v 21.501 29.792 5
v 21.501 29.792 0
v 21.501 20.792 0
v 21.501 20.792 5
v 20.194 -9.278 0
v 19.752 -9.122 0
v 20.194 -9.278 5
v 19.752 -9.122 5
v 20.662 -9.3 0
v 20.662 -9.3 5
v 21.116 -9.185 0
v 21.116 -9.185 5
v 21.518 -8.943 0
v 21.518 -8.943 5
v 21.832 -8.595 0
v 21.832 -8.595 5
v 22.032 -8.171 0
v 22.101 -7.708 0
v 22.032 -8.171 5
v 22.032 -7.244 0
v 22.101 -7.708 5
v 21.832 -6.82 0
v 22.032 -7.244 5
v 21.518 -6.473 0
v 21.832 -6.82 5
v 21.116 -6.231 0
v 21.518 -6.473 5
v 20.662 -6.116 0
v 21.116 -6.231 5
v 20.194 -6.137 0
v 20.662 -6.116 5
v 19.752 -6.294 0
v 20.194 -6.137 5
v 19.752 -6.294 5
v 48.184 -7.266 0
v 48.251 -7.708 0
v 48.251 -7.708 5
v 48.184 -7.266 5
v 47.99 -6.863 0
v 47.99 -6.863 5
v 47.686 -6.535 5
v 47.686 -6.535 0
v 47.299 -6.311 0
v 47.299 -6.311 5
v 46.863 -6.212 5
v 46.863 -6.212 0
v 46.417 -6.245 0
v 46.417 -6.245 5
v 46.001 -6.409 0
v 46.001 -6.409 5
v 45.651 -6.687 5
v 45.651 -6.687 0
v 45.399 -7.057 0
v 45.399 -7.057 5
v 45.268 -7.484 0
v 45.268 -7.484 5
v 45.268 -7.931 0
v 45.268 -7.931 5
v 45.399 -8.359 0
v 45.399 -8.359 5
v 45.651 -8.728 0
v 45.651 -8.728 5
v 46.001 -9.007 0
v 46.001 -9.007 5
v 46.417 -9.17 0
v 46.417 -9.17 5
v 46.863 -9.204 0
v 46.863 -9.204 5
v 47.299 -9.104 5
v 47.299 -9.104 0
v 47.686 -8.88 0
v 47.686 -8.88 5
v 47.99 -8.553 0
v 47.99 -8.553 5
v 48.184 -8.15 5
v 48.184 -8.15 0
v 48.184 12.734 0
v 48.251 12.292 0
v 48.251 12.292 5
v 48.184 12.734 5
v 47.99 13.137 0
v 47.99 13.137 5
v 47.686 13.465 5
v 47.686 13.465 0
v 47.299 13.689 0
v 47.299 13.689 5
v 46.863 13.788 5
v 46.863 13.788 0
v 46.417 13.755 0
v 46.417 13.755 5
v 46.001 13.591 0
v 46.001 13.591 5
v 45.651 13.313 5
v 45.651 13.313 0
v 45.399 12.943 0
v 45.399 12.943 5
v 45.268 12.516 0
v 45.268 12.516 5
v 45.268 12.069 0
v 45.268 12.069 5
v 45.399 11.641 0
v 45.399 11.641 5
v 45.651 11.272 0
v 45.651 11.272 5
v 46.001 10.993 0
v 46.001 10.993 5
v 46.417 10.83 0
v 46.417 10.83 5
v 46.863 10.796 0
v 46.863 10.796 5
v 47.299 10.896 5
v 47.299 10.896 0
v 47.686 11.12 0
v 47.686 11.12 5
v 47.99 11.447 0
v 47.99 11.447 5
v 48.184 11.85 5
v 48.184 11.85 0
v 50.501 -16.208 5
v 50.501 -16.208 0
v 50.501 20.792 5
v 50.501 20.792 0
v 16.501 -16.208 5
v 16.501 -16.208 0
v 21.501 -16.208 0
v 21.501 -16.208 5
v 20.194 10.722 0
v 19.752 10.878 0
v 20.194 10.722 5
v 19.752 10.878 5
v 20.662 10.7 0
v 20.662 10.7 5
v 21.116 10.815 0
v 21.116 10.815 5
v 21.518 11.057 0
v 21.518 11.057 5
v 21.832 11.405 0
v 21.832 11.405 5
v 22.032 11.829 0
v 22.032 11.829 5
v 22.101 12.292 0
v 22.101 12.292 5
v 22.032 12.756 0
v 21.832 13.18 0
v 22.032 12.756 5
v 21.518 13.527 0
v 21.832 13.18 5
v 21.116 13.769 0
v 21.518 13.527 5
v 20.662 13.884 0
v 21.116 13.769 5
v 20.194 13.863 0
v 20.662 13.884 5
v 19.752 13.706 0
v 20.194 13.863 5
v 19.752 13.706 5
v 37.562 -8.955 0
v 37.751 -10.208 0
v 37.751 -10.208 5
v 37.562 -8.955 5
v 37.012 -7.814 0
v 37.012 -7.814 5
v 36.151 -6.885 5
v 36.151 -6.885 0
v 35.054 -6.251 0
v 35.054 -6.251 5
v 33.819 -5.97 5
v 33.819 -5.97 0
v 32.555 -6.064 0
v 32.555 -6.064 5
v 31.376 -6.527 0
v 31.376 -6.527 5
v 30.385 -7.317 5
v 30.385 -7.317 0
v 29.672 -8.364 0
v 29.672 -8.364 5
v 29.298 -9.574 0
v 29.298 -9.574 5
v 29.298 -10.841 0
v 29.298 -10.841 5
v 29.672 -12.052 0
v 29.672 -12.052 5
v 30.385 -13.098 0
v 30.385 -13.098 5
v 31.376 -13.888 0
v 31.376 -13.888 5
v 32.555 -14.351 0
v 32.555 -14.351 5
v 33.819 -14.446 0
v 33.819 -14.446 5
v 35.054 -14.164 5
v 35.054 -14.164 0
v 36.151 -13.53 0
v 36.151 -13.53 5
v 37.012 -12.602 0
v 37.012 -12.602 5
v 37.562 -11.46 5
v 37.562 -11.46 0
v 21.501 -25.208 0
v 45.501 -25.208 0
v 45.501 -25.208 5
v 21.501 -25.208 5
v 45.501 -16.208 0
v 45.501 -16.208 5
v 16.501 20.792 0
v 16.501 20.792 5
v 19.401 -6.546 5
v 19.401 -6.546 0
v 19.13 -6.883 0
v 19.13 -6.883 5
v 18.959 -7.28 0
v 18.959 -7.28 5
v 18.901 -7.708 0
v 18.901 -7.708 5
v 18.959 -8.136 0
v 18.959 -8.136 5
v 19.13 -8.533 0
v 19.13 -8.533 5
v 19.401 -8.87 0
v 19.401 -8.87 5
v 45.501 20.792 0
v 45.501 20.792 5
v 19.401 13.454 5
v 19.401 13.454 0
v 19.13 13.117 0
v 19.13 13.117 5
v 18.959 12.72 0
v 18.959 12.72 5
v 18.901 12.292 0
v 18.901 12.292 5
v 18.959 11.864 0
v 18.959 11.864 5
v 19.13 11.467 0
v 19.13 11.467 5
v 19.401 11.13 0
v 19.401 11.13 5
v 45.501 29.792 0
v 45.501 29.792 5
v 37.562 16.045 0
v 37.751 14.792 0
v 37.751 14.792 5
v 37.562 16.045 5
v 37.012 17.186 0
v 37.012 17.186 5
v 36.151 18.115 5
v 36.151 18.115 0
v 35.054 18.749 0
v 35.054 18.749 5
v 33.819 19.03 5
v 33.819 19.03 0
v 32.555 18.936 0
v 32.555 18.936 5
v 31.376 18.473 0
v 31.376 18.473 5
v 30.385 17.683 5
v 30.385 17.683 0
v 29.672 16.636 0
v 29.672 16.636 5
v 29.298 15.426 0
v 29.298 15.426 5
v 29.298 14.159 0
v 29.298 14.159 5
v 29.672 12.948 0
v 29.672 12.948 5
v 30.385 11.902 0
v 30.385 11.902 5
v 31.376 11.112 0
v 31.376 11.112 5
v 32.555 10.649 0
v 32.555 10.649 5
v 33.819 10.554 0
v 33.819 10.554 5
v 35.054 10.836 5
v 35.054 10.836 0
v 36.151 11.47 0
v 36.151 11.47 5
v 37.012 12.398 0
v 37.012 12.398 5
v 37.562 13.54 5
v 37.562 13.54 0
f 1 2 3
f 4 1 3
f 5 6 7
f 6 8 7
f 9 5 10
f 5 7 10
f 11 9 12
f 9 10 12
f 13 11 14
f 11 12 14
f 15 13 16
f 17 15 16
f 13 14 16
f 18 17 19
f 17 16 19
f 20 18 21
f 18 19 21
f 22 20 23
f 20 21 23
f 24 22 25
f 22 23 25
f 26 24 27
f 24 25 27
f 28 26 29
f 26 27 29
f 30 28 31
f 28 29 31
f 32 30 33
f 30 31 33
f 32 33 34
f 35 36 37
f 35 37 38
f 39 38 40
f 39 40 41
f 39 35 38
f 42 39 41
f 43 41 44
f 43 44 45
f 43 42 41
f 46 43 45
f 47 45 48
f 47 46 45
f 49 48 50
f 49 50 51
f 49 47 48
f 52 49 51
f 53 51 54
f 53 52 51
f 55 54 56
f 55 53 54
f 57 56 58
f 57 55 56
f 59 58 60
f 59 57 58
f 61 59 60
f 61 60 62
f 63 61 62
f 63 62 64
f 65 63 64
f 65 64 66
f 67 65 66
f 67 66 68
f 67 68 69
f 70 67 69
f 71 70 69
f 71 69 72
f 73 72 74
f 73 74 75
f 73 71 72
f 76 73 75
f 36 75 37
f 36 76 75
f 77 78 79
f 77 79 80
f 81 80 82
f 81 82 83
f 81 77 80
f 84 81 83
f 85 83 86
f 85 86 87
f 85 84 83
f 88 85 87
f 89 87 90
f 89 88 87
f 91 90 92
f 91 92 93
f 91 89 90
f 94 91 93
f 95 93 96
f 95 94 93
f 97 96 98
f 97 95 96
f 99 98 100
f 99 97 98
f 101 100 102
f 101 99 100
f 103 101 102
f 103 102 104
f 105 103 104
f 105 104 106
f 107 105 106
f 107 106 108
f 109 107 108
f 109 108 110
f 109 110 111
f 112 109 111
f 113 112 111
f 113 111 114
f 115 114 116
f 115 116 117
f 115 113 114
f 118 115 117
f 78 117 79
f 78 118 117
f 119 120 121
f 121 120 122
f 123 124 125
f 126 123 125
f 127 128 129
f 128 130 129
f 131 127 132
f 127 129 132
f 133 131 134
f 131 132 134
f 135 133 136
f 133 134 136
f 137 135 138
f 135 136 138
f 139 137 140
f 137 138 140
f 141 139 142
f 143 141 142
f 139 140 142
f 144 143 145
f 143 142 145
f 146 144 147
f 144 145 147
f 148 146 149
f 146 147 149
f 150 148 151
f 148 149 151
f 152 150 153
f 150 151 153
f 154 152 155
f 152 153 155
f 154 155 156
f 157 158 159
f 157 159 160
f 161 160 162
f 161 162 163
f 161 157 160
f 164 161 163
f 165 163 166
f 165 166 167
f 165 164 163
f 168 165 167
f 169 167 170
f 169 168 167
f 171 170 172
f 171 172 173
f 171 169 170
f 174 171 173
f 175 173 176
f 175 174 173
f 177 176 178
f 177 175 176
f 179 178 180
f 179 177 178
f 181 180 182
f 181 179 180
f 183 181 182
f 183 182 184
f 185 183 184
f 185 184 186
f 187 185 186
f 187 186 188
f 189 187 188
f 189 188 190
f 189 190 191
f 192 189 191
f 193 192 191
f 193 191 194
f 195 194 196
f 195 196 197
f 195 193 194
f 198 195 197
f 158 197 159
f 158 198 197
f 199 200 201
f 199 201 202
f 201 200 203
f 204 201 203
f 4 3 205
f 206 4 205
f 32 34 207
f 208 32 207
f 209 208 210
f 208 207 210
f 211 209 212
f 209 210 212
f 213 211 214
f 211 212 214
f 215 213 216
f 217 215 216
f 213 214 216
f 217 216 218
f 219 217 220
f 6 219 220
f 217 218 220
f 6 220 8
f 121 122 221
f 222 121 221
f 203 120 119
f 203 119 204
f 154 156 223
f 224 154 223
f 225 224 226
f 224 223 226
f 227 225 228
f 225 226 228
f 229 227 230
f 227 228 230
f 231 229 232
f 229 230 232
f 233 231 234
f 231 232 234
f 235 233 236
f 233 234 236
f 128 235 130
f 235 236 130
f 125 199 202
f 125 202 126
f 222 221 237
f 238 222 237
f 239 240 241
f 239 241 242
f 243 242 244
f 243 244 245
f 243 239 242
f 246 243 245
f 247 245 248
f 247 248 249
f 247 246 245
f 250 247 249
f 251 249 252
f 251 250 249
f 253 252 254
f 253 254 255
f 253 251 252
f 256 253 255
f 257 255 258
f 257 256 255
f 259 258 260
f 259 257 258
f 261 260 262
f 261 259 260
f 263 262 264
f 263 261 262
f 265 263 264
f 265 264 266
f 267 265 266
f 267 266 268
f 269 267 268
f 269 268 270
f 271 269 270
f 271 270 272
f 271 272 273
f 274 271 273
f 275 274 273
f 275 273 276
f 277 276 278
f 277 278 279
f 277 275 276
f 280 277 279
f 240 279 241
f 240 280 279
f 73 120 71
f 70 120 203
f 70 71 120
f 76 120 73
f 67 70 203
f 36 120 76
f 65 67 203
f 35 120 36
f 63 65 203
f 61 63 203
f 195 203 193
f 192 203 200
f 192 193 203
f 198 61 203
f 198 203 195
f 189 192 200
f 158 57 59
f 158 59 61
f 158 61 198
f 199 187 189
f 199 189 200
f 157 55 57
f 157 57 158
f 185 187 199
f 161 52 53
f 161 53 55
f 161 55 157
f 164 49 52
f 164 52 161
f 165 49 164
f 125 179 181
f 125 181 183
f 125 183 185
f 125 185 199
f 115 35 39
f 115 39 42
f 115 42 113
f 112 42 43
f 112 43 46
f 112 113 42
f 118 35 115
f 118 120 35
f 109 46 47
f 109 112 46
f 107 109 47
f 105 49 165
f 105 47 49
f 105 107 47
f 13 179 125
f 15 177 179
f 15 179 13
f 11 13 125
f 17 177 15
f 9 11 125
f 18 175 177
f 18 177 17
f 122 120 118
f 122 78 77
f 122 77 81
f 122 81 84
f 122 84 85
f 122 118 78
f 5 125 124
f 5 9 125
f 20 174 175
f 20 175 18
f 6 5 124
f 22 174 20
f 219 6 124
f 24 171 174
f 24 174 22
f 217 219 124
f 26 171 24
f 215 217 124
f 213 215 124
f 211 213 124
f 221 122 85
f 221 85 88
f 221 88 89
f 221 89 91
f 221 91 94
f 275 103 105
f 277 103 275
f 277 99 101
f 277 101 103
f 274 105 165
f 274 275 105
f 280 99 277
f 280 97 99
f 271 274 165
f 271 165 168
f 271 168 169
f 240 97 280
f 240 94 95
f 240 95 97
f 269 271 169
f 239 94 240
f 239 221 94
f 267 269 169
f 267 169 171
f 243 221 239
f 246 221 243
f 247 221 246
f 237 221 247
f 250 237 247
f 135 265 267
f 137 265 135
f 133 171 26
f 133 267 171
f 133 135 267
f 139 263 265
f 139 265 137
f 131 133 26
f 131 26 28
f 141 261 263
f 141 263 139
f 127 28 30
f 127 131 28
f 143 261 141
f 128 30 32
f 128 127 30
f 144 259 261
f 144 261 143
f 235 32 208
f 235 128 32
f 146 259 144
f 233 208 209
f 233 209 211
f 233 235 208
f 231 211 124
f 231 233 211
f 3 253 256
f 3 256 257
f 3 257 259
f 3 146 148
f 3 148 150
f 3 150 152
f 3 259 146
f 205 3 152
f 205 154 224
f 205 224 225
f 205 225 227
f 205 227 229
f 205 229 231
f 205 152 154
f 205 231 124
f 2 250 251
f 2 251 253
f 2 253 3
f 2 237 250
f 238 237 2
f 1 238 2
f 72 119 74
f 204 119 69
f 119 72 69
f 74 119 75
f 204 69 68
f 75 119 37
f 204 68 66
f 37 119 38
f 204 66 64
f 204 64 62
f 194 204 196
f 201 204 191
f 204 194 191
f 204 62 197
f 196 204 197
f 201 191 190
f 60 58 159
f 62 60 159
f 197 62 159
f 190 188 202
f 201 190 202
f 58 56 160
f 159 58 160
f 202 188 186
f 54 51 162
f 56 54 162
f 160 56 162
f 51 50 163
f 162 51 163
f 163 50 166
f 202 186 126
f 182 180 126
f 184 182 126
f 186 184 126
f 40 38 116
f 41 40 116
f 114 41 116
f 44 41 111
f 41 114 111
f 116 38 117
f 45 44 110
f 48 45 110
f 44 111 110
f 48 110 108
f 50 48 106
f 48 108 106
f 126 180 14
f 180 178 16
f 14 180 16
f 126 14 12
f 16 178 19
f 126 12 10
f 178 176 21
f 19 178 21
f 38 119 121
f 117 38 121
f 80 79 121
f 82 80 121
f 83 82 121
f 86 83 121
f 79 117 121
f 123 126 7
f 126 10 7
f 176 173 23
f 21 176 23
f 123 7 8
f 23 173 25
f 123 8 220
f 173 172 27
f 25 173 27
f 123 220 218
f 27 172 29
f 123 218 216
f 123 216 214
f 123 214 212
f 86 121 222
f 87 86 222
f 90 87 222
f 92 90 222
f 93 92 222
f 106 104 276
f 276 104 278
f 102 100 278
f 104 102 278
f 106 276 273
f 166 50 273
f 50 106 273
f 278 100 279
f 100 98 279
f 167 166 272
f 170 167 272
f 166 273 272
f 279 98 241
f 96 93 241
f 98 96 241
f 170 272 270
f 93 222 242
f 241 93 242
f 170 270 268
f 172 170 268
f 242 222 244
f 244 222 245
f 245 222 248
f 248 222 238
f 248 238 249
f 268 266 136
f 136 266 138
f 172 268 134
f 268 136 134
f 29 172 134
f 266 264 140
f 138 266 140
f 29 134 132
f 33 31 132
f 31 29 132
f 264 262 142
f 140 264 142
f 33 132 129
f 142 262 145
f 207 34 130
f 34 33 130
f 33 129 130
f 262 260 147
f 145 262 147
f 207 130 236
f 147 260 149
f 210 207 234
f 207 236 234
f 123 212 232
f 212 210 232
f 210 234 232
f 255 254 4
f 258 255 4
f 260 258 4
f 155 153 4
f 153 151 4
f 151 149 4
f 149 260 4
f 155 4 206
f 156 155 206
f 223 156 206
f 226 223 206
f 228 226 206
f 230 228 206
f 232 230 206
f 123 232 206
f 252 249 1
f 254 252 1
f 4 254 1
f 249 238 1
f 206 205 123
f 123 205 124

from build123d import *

# Parameters (mm, degrees)
SKETCH1_R           = 1.5
SKETCH1_R_2         = 4.25
SKETCH1_R_3         = 5
SKETCH1_R_4         = 1
BOSS_EXTRUDE2_DEPTH = 5
SKETCH2_W           = 0.5
SKETCH2_H           = 37
BOSS_EXTRUDE3_DEPTH = 5
CUT_EXTRUDE1_DEPTH  = 10
BOSS_EXTRUDE4_DEPTH = 5
SKETCH5_R           = 1.6
CUT_EXTRUDE2_DEPTH  = 10
BOSS_EXTRUDE5_DEPTH = 5
SKETCH7_R           = 1
BOSS_EXTRUDE6_DEPTH = 5
SKETCH8_W           = 5
SKETCH8_H           = 37
CUT_EXTRUDE3_DEPTH  = 33


with BuildPart() as part:
    # Sketch1 → Boss-Extrude2 (new body)
    with BuildSketch(Plane.XY):
        with BuildLine():
            Line((45.25091594, -25.207708346), (50.00091594, -20.457708346))
            Line((50.00091594, -20.457708346), (50.00091594, 24.688738263))
            Line((50.00091594, 24.688738263), (45.147362549, 29.542291654))
            Line((45.147362549, 29.542291654), (26.35446933, 29.542291654))
            Line((26.35446933, 29.542291654), (21.25091594, 24.438738263))
            Line((21.25091594, 24.438738263), (21.25091594, 18.042291654))
            Line((21.25091594, 18.042291654), (20.408095363, 18.042291654))
            Line((20.408095363, 18.042291654), (16.70086026, 18.042291654))
            ThreePointArc((16.70086026, 18.042291654), (12.892426636, 17.542145454), (9.3422674, 16.075624987))
            ThreePointArc((9.3422674, 16.075624987), (2.182128173, 13.100539865), (-5.49908406, 12.043324729))
            Line((-5.49908406, 12.043324729), (-5.49908406, 12.039085999))
            ThreePointArc((-5.49908406, 12.039085999), (-15.49908406, 2.292291654), (-5.49908406, -7.454502691))
            Line((-5.49908406, -7.454502691), (-5.49908406, -7.458741422))
            ThreePointArc((-5.49908406, -7.458741422), (2.182128173, -8.515956557), (9.3422674, -11.491041679))
            ThreePointArc((9.3422674, -11.491041679), (12.892426636, -12.957562146), (16.70086026, -13.457708346))
            Line((16.70086026, -13.457708346), (20.408095363, -13.457708346))
            Line((20.408095363, -13.457708346), (21.25091594, -13.457708346))
            Line((21.25091594, -13.457708346), (21.25091594, -20.207708346))
            Line((21.25091594, -20.207708346), (26.25091594, -25.207708346))
            Line((26.25091594, -25.207708346), (45.25091594, -25.207708346))
        make_face()
        with Locations((46.75091594, -7.707708346)):
            Circle(SKETCH1_R, mode=Mode.SUBTRACT)
        with Locations((46.75091594, 12.292291654)):
            Circle(SKETCH1_R, mode=Mode.SUBTRACT)
        with Locations((33.50091594, 14.792291654)):
            Circle(SKETCH1_R_2, mode=Mode.SUBTRACT)
        with Locations((33.50091594, -10.207708346)):
            Circle(SKETCH1_R_2, mode=Mode.SUBTRACT)
        with Locations((19.25091594, 12.292291654)):
            Circle(SKETCH1_R, mode=Mode.SUBTRACT)
        with Locations((19.25091594, -7.707708346)):
            Circle(SKETCH1_R, mode=Mode.SUBTRACT)
        with Locations((-5.74908406, 2.292291654)):
            Circle(SKETCH1_R_3, mode=Mode.SUBTRACT)
        with Locations((1.25091594, 2.354746229)):
            Circle(SKETCH1_R_4, mode=Mode.SUBTRACT)
        with Locations((-5.686629485, -4.707708346)):
            Circle(SKETCH1_R_4, mode=Mode.SUBTRACT)
        with Locations((-12.74908406, 2.229837079)):
            Circle(SKETCH1_R_4, mode=Mode.SUBTRACT)
        with Locations((-5.811538636, 9.292291654)):
            Circle(SKETCH1_R_4, mode=Mode.SUBTRACT)
    extrude(amount=BOSS_EXTRUDE2_DEPTH)

    # Sketch2 → Boss-Extrude3 (add)
    with BuildSketch(Plane(origin=(0, 0, 0), x_dir=(-1, 0, 0), z_dir=(0, 0, -1))):
        Polygon((-26.25091594, -25.207708346), (-21.50091594, -25.207708346), (-21.50091594, -20.457708346), align=None)
        Polygon((-45.25091594, -25.207708346), (-45.50091594, -25.207708346), (-45.50091594, -24.957708346), align=None)
        Polygon((-45.50091594, 29.188738263), (-45.50091594, 29.792291654), (-21.50091594, 29.792291654), (-21.50091594, 24.688738263), (-26.35446933, 29.542291654), (-45.147362549, 29.542291654), align=None)
        with Locations((-50.25091594, 2.292291654)):
            Rectangle(SKETCH2_W, SKETCH2_H)
    extrude(amount=-BOSS_EXTRUDE3_DEPTH)

    # Sketch3 → Cut-Extrude1 (cut)
    with BuildSketch(Plane(origin=(0, 0, 0), x_dir=(-1, 0, 0), z_dir=(0, 0, -1))):
        Polygon((-50.00091594, -16.207708346), (-45.50091594, -16.207708346), (-45.50091594, -25.207708346), (-50.00091594, -20.457708346), align=None)
        Polygon((-50.50091594, 20.792291654), (-45.50091594, 20.792291654), (-45.50091594, 29.188738263), (-50.00091594, 24.688738263), align=None)
        Polygon((-21.50091594, -16.207708346), (-21.50091594, -20.457708346), (-21.25091594, -20.207708346), (-21.25091594, -16.207708346), align=None)
        Polygon((-21.50091594, 20.792291654), (-21.25091594, 20.792291654), (-21.25091594, 24.438738263), (-21.50091594, 24.688738263), align=None)
    extrude(amount=-CUT_EXTRUDE1_DEPTH, mode=Mode.SUBTRACT)

    # Sketch4 → Boss-Extrude4 (add)
    with BuildSketch(Plane(origin=(0, 0, 0), x_dir=(-1, 0, 0), z_dir=(0, 0, -1))):
        with BuildLine():
            Line((-21.25091594, 20.792291654), (-16.50091594, 20.792291654))
            Line((-16.50091594, 20.792291654), (-16.50091594, 18.040936414))
            ThreePointArc((-16.50091594, 18.040936414), (-16.600885803, 18.04195284), (-16.70086026, 18.042291654))
            Line((-16.70086026, 18.042291654), (-21.25091594, 18.042291654))
            Line((-21.25091594, 18.042291654), (-21.25091594, 20.792291654))
        make_face()
        with BuildLine():
            Line((-16.50091594, -13.456353106), (-16.50091594, -16.207708346))
            Line((-16.50091594, -16.207708346), (-21.25091594, -16.207708346))
            Line((-21.25091594, -16.207708346), (-21.25091594, -13.457708346))
            Line((-21.25091594, -13.457708346), (-16.70086026, -13.457708346))
            ThreePointArc((-16.70086026, -13.457708346), (-16.600885803, -13.457369532), (-16.50091594, -13.456353106))
        make_face()
    extrude(amount=-BOSS_EXTRUDE4_DEPTH)

    # Sketch5 → Cut-Extrude2 (cut)
    with BuildSketch(Plane.XY.offset(5)):
        with Locations((20.50091594, -7.707708346)):
            Circle(SKETCH5_R)
        with Locations((20.50091594, 12.292291654)):
            Circle(SKETCH5_R)
    extrude(amount=-CUT_EXTRUDE2_DEPTH, mode=Mode.SUBTRACT)

    # Sketch6 → Boss-Extrude5 (add)
    with BuildSketch(Plane.XY.offset(5)):
        with BuildLine():
            ThreePointArc((19.75191594, -6.293848735), (18.90091594, -7.707708346), (19.75191594, -9.121567957))
            ThreePointArc((19.75191594, -9.121567957), (17.75091594, -7.707708346), (19.75191594, -6.293848735))
        make_face()
        with BuildLine():
            ThreePointArc((19.75191594, 13.706151265), (18.90091594, 12.292291654), (19.75191594, 10.878432043))
            ThreePointArc((19.75191594, 10.878432043), (17.75091594, 12.292291654), (19.75191594, 13.706151265))
        make_face()
    extrude(amount=-BOSS_EXTRUDE5_DEPTH)

    # Sketch7 → Boss-Extrude6 (add)
    with BuildSketch(Plane(origin=(0, 0, 0), x_dir=(-1, 0, 0), z_dir=(0, 0, -1))):
        with Locations((-1.25091594, 2.354746229)):
            Circle(SKETCH7_R)
        with Locations((12.74908406, 2.229837079)):
            Circle(SKETCH7_R)
    extrude(amount=-BOSS_EXTRUDE6_DEPTH)

    # Sketch8 → Cut-Extrude3 (cut, through all)
    with BuildSketch(Plane.ZY.offset(-16.50091594)):
        with Locations((2.5, 2.292291654)):
            Rectangle(SKETCH8_W, SKETCH8_H)
    extrude(amount=CUT_EXTRUDE3_DEPTH, mode=Mode.SUBTRACT)


solid = part.part
